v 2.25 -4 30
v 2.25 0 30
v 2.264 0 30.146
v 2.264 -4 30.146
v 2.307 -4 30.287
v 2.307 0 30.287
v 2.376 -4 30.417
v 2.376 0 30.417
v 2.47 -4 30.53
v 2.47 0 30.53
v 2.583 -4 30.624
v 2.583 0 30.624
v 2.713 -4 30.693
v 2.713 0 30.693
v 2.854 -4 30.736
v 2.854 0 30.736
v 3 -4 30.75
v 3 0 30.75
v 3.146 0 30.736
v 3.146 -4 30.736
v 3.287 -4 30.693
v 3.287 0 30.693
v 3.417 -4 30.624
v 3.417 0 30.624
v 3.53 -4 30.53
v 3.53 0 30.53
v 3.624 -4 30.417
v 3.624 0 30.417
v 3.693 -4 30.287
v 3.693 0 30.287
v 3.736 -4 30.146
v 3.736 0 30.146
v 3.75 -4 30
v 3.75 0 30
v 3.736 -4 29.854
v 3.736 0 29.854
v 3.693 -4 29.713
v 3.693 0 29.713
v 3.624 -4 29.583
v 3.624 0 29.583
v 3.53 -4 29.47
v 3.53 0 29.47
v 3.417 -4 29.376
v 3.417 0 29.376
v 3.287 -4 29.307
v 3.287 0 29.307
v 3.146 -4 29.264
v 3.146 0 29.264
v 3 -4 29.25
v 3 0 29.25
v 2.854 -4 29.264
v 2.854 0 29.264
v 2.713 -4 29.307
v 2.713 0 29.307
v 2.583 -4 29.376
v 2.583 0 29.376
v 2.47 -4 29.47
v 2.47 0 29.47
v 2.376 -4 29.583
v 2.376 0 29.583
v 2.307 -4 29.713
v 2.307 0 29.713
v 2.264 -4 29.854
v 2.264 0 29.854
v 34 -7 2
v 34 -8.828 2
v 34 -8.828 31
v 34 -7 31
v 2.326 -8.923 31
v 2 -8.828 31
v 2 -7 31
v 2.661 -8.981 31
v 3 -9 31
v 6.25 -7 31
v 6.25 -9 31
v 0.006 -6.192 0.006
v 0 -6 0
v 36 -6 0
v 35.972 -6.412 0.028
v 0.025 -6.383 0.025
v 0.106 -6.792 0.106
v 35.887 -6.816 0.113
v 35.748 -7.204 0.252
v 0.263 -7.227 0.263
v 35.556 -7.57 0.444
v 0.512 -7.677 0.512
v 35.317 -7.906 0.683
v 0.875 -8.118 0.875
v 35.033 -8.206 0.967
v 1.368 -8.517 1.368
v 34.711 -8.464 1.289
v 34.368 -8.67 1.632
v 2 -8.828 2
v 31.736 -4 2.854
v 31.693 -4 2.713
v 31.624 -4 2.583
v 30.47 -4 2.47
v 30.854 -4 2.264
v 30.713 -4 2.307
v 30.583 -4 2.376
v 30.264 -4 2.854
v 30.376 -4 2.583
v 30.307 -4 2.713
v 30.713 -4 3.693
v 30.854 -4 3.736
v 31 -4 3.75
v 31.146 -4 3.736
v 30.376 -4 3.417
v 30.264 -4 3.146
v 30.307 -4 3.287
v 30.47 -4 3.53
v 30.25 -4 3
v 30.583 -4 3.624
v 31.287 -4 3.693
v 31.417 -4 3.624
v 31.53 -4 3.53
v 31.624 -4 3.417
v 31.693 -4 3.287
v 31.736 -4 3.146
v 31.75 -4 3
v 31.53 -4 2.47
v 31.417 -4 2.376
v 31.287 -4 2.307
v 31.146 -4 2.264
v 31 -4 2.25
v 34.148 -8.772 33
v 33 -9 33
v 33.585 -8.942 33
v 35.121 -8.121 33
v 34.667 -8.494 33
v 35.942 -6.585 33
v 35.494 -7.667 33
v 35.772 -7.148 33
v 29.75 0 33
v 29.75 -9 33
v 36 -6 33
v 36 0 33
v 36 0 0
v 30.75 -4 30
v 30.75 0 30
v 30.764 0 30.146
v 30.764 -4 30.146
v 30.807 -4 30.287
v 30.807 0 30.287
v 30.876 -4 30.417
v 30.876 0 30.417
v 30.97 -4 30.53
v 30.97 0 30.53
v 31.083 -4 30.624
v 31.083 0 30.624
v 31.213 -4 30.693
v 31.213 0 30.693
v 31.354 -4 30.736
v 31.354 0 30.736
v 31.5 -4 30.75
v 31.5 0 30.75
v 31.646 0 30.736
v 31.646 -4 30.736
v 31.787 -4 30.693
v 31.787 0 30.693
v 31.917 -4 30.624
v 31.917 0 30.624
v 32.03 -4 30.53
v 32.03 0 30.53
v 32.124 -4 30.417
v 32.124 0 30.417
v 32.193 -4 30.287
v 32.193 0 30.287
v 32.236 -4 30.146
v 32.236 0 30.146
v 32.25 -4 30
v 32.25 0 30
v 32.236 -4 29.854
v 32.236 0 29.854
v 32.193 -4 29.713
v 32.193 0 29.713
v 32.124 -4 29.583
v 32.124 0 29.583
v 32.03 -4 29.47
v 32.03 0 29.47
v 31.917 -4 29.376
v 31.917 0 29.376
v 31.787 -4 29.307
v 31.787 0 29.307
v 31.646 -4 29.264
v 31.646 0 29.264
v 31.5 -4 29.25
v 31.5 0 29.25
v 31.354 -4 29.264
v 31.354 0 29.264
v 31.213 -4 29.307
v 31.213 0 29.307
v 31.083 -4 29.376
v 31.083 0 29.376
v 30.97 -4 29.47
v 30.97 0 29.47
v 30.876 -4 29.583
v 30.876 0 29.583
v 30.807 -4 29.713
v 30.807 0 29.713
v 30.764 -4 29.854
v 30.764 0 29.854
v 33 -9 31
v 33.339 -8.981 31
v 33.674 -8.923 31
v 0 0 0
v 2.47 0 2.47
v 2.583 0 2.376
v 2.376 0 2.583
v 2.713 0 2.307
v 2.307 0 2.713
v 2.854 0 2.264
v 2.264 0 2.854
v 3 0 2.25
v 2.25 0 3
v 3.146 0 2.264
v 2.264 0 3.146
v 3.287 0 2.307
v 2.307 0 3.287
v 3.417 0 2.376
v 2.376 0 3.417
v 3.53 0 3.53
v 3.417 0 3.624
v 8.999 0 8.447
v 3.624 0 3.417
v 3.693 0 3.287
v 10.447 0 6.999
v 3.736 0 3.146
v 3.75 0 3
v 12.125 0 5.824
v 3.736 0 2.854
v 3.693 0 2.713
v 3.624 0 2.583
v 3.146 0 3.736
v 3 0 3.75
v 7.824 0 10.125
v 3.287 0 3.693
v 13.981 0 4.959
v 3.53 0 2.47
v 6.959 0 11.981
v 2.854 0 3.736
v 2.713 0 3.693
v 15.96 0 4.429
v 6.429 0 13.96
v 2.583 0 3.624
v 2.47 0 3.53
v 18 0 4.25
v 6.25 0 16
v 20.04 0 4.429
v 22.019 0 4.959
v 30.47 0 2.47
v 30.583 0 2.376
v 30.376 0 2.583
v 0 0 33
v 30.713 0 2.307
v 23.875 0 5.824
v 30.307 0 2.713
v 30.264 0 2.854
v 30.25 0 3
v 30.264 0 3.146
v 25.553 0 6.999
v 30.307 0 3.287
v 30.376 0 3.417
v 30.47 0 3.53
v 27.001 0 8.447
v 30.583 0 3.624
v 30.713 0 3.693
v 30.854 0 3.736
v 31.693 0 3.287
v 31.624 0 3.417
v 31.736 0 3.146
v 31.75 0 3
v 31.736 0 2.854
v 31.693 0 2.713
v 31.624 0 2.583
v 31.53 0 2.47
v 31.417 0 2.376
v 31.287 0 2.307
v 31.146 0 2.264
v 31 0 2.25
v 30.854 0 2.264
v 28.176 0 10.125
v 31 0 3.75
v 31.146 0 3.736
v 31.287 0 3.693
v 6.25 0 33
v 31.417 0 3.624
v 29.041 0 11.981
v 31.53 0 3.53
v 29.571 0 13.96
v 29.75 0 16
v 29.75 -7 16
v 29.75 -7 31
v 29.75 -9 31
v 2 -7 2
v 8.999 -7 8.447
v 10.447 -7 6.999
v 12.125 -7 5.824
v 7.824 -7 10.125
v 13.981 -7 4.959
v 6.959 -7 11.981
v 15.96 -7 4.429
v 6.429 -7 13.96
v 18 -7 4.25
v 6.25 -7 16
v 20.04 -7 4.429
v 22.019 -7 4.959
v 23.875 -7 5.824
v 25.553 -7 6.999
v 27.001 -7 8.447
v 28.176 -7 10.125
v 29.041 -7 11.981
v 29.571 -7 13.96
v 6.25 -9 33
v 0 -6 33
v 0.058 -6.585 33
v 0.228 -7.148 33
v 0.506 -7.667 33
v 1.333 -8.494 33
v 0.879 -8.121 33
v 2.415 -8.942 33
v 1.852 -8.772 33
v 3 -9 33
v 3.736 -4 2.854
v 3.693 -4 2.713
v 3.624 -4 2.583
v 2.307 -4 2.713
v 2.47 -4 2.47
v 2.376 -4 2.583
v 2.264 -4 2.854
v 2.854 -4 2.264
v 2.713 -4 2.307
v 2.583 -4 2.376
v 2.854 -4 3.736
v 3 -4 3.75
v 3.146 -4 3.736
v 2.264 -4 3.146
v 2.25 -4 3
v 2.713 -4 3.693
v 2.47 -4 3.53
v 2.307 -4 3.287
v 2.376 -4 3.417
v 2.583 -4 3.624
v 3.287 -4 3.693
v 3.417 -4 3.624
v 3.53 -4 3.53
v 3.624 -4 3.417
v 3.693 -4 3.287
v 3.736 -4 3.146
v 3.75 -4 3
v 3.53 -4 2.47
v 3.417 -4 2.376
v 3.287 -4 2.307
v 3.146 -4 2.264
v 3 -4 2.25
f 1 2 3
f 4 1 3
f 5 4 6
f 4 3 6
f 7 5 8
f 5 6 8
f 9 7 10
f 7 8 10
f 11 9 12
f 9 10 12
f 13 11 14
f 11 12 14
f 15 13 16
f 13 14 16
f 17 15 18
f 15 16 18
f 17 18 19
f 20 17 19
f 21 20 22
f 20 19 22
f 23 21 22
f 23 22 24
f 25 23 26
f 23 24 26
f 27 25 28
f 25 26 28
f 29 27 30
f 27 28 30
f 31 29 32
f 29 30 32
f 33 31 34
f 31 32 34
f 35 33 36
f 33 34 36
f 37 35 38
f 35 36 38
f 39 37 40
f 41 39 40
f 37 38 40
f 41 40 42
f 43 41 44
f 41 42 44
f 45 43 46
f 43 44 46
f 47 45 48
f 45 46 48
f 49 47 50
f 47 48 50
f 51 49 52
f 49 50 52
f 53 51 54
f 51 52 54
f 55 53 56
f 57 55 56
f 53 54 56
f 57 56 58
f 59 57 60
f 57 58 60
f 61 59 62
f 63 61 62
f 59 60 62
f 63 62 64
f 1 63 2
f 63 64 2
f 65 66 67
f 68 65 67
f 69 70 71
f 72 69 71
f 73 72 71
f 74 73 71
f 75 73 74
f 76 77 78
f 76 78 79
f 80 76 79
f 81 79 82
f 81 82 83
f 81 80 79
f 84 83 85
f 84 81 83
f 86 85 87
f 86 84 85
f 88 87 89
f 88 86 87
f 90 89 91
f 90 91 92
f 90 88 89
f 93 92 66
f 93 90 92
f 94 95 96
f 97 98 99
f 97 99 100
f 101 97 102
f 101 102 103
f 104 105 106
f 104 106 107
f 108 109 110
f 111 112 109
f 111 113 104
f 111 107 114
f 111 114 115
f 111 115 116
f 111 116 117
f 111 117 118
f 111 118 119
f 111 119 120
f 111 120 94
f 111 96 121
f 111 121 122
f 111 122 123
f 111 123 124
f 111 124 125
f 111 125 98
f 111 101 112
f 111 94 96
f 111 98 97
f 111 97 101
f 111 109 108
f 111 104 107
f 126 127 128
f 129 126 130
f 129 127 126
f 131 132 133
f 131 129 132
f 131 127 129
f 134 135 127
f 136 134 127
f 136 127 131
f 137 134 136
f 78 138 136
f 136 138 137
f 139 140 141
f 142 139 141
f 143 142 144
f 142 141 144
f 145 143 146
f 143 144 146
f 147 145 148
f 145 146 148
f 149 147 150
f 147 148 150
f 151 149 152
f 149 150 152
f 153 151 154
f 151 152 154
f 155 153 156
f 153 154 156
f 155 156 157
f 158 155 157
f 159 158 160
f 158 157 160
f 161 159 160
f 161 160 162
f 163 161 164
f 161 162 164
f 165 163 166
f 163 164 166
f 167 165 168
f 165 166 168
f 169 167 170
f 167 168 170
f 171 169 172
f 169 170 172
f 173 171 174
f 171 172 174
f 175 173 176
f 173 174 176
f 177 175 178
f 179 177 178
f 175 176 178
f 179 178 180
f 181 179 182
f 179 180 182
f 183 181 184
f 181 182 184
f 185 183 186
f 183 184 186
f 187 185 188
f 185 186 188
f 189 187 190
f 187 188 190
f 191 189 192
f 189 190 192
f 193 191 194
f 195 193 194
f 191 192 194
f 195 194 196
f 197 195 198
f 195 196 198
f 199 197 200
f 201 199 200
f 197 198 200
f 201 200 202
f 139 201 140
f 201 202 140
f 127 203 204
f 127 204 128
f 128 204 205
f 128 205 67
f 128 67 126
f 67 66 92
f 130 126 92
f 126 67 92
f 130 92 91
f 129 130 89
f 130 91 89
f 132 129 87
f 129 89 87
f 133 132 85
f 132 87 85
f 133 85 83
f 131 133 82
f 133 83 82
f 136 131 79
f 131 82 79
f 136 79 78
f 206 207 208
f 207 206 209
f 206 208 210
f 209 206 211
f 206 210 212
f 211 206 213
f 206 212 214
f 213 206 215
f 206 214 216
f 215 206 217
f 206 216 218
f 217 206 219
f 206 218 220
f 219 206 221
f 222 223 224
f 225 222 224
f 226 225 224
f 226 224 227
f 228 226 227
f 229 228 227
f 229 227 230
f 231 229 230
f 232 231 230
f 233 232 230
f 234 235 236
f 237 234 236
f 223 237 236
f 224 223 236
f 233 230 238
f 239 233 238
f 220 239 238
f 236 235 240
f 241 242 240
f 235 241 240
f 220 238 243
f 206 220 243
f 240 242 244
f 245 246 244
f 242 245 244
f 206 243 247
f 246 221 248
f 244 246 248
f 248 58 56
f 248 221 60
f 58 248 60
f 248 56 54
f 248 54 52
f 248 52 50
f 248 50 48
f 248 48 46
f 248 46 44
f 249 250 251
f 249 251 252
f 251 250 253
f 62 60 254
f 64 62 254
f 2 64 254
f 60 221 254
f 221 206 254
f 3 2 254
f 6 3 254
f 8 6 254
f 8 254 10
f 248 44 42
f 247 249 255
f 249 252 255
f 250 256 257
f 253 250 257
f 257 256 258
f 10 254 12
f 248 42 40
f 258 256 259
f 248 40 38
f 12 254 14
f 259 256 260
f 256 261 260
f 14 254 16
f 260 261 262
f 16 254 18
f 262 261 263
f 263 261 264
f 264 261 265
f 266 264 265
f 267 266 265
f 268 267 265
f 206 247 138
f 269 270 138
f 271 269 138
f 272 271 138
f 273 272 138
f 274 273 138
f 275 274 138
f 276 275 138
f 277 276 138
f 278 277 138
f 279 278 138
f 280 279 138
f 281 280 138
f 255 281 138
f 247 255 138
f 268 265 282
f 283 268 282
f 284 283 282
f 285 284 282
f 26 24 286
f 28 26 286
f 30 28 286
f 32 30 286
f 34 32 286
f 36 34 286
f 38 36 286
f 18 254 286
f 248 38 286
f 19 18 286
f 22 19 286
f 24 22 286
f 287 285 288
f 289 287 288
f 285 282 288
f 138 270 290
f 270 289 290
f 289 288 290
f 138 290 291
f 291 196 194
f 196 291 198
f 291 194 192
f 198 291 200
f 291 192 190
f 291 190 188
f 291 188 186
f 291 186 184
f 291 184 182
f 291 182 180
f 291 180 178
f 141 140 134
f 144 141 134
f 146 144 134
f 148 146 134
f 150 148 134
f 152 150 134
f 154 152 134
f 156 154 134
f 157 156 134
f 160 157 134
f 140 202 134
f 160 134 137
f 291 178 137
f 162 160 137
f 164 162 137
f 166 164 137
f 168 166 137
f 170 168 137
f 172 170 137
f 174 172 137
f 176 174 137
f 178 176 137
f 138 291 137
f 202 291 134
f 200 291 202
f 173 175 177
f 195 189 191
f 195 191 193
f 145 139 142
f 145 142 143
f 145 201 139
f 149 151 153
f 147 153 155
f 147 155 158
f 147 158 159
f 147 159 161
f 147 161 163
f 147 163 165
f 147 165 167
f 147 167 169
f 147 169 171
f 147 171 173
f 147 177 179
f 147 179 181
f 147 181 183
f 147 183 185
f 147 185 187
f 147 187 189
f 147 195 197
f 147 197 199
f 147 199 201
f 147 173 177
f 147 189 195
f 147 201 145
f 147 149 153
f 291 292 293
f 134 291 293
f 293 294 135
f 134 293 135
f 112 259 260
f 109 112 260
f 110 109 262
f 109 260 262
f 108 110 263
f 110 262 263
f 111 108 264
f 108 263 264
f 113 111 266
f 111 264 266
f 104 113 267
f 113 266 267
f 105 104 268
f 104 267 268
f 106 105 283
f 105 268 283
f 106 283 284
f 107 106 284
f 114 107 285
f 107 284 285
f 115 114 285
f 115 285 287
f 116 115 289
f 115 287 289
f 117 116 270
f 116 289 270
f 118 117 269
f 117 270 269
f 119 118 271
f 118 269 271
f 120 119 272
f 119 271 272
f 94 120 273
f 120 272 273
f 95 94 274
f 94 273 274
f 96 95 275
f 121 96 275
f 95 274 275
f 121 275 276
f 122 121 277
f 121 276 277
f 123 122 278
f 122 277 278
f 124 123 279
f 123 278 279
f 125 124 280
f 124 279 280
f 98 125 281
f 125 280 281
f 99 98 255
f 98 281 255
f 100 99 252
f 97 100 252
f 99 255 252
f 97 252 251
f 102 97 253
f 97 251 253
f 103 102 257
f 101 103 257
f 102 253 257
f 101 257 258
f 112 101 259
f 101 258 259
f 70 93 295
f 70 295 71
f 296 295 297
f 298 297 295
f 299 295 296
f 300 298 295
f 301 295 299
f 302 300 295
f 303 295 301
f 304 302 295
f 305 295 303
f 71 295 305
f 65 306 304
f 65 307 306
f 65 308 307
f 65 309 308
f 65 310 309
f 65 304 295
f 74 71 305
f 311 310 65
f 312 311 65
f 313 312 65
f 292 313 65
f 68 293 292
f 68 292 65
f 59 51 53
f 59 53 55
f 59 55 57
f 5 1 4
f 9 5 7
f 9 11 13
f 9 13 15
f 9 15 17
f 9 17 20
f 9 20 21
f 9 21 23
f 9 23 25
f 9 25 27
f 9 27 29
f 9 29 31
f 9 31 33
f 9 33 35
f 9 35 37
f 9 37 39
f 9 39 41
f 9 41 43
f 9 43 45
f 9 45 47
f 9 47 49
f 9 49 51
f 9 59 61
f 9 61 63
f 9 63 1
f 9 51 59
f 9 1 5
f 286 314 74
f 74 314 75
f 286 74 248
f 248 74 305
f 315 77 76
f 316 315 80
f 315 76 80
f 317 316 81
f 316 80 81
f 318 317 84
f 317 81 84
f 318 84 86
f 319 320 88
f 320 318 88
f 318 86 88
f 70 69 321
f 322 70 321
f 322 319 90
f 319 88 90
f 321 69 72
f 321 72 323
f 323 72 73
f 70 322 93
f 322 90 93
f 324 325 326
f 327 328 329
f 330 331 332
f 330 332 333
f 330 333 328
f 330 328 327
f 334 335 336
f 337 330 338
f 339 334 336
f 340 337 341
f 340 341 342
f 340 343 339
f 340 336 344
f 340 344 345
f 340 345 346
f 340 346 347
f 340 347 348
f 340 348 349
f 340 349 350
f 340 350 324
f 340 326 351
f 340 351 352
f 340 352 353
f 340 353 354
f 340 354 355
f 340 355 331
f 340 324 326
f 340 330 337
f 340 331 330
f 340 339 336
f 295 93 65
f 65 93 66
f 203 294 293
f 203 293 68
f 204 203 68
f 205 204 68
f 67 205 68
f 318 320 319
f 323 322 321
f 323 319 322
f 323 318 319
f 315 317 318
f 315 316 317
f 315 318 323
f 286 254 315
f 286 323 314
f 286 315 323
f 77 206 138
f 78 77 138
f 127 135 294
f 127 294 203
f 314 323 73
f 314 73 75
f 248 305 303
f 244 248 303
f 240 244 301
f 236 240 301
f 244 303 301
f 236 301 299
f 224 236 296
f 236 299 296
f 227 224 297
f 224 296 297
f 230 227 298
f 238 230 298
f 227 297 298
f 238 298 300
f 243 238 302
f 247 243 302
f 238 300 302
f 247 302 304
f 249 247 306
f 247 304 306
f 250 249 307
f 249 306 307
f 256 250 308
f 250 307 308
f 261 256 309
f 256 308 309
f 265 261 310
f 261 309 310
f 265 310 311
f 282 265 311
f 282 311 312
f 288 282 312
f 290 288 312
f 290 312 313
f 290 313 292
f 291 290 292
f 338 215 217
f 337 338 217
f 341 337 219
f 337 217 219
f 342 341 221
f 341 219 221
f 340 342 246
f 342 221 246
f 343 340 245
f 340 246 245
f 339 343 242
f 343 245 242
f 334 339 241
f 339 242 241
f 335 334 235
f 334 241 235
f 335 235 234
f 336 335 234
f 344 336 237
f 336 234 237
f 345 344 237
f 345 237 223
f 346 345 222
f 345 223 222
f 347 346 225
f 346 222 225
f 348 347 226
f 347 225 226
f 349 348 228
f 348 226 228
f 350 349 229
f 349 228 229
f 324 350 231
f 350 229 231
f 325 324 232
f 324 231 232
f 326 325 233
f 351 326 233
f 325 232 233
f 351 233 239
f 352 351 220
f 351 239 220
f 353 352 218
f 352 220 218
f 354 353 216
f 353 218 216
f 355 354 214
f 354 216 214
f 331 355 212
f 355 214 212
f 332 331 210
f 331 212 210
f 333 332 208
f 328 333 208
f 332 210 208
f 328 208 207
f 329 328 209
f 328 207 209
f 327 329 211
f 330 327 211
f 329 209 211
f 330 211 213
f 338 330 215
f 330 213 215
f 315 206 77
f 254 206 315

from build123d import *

# Parameters (mm, degrees)
F0_W        = 36
F0_H        = 33
F1_DEPTH    = 9
F3_DEPTH    = 25
F4_W        = 32
F4_H        = 29
F5_DEPTH    = 2
F6_R        = 0.75
F7_DEPTH    = 4
F8_T1_DEPTH = 48
F8_T3_DEPTH = 51


# Not quite as in the source:
# - a fillet or chamfer that OpenCascade refuses, or shapes differently, is made with other operations: its cross-section is extruded or revolved along the edge and cut away or added


with BuildPart() as f1:
    # F0 (on Front) → F1 (new body)
    with BuildSketch(Plane.XZ):
        with Locations((18, 16.5)):
            Rectangle(F0_W, F0_H)
    extrude(amount=F1_DEPTH)

    # F2 (on face) → F3 (cut)
    with BuildSketch(Plane.XZ.offset(9)):
        with BuildLine():
            ThreePointArc((6.25, 16), (18, 4.25), (29.75, 16))
            ThreePointArc((29.75, 16), (18, 27.75), (6.25, 16))
        make_face()
        with BuildLine():
            ThreePointArc((6.25, 16), (18, 27.75), (29.75, 16))
            Line((29.75, 16), (29.75, 33))
            Line((29.75, 33), (6.25, 33))
            Line((6.25, 33), (6.25, 16))
        make_face()
    extrude(amount=-F3_DEPTH, mode=Mode.SUBTRACT)

    # F4 (on face) → F5 (cut)
    with BuildSketch(Plane.XZ.offset(9)):
        with Locations((18, 16.5)):
            Rectangle(F4_W, F4_H)
    extrude(amount=-F5_DEPTH, mode=Mode.SUBTRACT)

    # F6 (on face) → F7 (cut)
    with BuildSketch(Plane(origin=(0, 0, 0), x_dir=(-1, 0, 0), z_dir=(0, 1, 0))):
        with Locations((-31.5, 30)):
            Circle(F6_R)
        with Locations((-3, 30)):
            Circle(F6_R)
        with Locations((-3, 3)):
            Circle(F6_R)
        with Locations((-31, 3)):
            Circle(F6_R)
    extrude(amount=-F7_DEPTH, mode=Mode.SUBTRACT)

    # F8: fillet of radius 3 on 3 edges, made by hand

    # F8_s2 → F8_t1 (cut)
    with BuildSketch(Plane.XY.offset(-7.5)):
        with BuildLine():
            ThreePointArc((33, -9), (35.1213203436, -8.1213203436), (36, -6))
            Line((36, -6), (36, -9))
            Line((36, -9), (33, -9))
        make_face()
        with BuildLine():
            ThreePointArc((0, -6), (0.8786796564, -8.1213203436), (3, -9))
            Line((3, -9), (0, -9))
            Line((0, -9), (0, -6))
        make_face()
    extrude(amount=F8_T1_DEPTH, mode=Mode.SUBTRACT)

    # F8_s4 → F8_t3 (cut)
    with BuildSketch(Plane.YZ.offset(-7.5)):
        with BuildLine():
            ThreePointArc((-6, 0), (-8.1213203436, 0.8786796564), (-9, 3))
            Line((-9, 3), (-9, 0))
            Line((-9, 0), (-6, 0))
        make_face()
    extrude(amount=F8_T3_DEPTH, mode=Mode.SUBTRACT)


solid = f1.part
